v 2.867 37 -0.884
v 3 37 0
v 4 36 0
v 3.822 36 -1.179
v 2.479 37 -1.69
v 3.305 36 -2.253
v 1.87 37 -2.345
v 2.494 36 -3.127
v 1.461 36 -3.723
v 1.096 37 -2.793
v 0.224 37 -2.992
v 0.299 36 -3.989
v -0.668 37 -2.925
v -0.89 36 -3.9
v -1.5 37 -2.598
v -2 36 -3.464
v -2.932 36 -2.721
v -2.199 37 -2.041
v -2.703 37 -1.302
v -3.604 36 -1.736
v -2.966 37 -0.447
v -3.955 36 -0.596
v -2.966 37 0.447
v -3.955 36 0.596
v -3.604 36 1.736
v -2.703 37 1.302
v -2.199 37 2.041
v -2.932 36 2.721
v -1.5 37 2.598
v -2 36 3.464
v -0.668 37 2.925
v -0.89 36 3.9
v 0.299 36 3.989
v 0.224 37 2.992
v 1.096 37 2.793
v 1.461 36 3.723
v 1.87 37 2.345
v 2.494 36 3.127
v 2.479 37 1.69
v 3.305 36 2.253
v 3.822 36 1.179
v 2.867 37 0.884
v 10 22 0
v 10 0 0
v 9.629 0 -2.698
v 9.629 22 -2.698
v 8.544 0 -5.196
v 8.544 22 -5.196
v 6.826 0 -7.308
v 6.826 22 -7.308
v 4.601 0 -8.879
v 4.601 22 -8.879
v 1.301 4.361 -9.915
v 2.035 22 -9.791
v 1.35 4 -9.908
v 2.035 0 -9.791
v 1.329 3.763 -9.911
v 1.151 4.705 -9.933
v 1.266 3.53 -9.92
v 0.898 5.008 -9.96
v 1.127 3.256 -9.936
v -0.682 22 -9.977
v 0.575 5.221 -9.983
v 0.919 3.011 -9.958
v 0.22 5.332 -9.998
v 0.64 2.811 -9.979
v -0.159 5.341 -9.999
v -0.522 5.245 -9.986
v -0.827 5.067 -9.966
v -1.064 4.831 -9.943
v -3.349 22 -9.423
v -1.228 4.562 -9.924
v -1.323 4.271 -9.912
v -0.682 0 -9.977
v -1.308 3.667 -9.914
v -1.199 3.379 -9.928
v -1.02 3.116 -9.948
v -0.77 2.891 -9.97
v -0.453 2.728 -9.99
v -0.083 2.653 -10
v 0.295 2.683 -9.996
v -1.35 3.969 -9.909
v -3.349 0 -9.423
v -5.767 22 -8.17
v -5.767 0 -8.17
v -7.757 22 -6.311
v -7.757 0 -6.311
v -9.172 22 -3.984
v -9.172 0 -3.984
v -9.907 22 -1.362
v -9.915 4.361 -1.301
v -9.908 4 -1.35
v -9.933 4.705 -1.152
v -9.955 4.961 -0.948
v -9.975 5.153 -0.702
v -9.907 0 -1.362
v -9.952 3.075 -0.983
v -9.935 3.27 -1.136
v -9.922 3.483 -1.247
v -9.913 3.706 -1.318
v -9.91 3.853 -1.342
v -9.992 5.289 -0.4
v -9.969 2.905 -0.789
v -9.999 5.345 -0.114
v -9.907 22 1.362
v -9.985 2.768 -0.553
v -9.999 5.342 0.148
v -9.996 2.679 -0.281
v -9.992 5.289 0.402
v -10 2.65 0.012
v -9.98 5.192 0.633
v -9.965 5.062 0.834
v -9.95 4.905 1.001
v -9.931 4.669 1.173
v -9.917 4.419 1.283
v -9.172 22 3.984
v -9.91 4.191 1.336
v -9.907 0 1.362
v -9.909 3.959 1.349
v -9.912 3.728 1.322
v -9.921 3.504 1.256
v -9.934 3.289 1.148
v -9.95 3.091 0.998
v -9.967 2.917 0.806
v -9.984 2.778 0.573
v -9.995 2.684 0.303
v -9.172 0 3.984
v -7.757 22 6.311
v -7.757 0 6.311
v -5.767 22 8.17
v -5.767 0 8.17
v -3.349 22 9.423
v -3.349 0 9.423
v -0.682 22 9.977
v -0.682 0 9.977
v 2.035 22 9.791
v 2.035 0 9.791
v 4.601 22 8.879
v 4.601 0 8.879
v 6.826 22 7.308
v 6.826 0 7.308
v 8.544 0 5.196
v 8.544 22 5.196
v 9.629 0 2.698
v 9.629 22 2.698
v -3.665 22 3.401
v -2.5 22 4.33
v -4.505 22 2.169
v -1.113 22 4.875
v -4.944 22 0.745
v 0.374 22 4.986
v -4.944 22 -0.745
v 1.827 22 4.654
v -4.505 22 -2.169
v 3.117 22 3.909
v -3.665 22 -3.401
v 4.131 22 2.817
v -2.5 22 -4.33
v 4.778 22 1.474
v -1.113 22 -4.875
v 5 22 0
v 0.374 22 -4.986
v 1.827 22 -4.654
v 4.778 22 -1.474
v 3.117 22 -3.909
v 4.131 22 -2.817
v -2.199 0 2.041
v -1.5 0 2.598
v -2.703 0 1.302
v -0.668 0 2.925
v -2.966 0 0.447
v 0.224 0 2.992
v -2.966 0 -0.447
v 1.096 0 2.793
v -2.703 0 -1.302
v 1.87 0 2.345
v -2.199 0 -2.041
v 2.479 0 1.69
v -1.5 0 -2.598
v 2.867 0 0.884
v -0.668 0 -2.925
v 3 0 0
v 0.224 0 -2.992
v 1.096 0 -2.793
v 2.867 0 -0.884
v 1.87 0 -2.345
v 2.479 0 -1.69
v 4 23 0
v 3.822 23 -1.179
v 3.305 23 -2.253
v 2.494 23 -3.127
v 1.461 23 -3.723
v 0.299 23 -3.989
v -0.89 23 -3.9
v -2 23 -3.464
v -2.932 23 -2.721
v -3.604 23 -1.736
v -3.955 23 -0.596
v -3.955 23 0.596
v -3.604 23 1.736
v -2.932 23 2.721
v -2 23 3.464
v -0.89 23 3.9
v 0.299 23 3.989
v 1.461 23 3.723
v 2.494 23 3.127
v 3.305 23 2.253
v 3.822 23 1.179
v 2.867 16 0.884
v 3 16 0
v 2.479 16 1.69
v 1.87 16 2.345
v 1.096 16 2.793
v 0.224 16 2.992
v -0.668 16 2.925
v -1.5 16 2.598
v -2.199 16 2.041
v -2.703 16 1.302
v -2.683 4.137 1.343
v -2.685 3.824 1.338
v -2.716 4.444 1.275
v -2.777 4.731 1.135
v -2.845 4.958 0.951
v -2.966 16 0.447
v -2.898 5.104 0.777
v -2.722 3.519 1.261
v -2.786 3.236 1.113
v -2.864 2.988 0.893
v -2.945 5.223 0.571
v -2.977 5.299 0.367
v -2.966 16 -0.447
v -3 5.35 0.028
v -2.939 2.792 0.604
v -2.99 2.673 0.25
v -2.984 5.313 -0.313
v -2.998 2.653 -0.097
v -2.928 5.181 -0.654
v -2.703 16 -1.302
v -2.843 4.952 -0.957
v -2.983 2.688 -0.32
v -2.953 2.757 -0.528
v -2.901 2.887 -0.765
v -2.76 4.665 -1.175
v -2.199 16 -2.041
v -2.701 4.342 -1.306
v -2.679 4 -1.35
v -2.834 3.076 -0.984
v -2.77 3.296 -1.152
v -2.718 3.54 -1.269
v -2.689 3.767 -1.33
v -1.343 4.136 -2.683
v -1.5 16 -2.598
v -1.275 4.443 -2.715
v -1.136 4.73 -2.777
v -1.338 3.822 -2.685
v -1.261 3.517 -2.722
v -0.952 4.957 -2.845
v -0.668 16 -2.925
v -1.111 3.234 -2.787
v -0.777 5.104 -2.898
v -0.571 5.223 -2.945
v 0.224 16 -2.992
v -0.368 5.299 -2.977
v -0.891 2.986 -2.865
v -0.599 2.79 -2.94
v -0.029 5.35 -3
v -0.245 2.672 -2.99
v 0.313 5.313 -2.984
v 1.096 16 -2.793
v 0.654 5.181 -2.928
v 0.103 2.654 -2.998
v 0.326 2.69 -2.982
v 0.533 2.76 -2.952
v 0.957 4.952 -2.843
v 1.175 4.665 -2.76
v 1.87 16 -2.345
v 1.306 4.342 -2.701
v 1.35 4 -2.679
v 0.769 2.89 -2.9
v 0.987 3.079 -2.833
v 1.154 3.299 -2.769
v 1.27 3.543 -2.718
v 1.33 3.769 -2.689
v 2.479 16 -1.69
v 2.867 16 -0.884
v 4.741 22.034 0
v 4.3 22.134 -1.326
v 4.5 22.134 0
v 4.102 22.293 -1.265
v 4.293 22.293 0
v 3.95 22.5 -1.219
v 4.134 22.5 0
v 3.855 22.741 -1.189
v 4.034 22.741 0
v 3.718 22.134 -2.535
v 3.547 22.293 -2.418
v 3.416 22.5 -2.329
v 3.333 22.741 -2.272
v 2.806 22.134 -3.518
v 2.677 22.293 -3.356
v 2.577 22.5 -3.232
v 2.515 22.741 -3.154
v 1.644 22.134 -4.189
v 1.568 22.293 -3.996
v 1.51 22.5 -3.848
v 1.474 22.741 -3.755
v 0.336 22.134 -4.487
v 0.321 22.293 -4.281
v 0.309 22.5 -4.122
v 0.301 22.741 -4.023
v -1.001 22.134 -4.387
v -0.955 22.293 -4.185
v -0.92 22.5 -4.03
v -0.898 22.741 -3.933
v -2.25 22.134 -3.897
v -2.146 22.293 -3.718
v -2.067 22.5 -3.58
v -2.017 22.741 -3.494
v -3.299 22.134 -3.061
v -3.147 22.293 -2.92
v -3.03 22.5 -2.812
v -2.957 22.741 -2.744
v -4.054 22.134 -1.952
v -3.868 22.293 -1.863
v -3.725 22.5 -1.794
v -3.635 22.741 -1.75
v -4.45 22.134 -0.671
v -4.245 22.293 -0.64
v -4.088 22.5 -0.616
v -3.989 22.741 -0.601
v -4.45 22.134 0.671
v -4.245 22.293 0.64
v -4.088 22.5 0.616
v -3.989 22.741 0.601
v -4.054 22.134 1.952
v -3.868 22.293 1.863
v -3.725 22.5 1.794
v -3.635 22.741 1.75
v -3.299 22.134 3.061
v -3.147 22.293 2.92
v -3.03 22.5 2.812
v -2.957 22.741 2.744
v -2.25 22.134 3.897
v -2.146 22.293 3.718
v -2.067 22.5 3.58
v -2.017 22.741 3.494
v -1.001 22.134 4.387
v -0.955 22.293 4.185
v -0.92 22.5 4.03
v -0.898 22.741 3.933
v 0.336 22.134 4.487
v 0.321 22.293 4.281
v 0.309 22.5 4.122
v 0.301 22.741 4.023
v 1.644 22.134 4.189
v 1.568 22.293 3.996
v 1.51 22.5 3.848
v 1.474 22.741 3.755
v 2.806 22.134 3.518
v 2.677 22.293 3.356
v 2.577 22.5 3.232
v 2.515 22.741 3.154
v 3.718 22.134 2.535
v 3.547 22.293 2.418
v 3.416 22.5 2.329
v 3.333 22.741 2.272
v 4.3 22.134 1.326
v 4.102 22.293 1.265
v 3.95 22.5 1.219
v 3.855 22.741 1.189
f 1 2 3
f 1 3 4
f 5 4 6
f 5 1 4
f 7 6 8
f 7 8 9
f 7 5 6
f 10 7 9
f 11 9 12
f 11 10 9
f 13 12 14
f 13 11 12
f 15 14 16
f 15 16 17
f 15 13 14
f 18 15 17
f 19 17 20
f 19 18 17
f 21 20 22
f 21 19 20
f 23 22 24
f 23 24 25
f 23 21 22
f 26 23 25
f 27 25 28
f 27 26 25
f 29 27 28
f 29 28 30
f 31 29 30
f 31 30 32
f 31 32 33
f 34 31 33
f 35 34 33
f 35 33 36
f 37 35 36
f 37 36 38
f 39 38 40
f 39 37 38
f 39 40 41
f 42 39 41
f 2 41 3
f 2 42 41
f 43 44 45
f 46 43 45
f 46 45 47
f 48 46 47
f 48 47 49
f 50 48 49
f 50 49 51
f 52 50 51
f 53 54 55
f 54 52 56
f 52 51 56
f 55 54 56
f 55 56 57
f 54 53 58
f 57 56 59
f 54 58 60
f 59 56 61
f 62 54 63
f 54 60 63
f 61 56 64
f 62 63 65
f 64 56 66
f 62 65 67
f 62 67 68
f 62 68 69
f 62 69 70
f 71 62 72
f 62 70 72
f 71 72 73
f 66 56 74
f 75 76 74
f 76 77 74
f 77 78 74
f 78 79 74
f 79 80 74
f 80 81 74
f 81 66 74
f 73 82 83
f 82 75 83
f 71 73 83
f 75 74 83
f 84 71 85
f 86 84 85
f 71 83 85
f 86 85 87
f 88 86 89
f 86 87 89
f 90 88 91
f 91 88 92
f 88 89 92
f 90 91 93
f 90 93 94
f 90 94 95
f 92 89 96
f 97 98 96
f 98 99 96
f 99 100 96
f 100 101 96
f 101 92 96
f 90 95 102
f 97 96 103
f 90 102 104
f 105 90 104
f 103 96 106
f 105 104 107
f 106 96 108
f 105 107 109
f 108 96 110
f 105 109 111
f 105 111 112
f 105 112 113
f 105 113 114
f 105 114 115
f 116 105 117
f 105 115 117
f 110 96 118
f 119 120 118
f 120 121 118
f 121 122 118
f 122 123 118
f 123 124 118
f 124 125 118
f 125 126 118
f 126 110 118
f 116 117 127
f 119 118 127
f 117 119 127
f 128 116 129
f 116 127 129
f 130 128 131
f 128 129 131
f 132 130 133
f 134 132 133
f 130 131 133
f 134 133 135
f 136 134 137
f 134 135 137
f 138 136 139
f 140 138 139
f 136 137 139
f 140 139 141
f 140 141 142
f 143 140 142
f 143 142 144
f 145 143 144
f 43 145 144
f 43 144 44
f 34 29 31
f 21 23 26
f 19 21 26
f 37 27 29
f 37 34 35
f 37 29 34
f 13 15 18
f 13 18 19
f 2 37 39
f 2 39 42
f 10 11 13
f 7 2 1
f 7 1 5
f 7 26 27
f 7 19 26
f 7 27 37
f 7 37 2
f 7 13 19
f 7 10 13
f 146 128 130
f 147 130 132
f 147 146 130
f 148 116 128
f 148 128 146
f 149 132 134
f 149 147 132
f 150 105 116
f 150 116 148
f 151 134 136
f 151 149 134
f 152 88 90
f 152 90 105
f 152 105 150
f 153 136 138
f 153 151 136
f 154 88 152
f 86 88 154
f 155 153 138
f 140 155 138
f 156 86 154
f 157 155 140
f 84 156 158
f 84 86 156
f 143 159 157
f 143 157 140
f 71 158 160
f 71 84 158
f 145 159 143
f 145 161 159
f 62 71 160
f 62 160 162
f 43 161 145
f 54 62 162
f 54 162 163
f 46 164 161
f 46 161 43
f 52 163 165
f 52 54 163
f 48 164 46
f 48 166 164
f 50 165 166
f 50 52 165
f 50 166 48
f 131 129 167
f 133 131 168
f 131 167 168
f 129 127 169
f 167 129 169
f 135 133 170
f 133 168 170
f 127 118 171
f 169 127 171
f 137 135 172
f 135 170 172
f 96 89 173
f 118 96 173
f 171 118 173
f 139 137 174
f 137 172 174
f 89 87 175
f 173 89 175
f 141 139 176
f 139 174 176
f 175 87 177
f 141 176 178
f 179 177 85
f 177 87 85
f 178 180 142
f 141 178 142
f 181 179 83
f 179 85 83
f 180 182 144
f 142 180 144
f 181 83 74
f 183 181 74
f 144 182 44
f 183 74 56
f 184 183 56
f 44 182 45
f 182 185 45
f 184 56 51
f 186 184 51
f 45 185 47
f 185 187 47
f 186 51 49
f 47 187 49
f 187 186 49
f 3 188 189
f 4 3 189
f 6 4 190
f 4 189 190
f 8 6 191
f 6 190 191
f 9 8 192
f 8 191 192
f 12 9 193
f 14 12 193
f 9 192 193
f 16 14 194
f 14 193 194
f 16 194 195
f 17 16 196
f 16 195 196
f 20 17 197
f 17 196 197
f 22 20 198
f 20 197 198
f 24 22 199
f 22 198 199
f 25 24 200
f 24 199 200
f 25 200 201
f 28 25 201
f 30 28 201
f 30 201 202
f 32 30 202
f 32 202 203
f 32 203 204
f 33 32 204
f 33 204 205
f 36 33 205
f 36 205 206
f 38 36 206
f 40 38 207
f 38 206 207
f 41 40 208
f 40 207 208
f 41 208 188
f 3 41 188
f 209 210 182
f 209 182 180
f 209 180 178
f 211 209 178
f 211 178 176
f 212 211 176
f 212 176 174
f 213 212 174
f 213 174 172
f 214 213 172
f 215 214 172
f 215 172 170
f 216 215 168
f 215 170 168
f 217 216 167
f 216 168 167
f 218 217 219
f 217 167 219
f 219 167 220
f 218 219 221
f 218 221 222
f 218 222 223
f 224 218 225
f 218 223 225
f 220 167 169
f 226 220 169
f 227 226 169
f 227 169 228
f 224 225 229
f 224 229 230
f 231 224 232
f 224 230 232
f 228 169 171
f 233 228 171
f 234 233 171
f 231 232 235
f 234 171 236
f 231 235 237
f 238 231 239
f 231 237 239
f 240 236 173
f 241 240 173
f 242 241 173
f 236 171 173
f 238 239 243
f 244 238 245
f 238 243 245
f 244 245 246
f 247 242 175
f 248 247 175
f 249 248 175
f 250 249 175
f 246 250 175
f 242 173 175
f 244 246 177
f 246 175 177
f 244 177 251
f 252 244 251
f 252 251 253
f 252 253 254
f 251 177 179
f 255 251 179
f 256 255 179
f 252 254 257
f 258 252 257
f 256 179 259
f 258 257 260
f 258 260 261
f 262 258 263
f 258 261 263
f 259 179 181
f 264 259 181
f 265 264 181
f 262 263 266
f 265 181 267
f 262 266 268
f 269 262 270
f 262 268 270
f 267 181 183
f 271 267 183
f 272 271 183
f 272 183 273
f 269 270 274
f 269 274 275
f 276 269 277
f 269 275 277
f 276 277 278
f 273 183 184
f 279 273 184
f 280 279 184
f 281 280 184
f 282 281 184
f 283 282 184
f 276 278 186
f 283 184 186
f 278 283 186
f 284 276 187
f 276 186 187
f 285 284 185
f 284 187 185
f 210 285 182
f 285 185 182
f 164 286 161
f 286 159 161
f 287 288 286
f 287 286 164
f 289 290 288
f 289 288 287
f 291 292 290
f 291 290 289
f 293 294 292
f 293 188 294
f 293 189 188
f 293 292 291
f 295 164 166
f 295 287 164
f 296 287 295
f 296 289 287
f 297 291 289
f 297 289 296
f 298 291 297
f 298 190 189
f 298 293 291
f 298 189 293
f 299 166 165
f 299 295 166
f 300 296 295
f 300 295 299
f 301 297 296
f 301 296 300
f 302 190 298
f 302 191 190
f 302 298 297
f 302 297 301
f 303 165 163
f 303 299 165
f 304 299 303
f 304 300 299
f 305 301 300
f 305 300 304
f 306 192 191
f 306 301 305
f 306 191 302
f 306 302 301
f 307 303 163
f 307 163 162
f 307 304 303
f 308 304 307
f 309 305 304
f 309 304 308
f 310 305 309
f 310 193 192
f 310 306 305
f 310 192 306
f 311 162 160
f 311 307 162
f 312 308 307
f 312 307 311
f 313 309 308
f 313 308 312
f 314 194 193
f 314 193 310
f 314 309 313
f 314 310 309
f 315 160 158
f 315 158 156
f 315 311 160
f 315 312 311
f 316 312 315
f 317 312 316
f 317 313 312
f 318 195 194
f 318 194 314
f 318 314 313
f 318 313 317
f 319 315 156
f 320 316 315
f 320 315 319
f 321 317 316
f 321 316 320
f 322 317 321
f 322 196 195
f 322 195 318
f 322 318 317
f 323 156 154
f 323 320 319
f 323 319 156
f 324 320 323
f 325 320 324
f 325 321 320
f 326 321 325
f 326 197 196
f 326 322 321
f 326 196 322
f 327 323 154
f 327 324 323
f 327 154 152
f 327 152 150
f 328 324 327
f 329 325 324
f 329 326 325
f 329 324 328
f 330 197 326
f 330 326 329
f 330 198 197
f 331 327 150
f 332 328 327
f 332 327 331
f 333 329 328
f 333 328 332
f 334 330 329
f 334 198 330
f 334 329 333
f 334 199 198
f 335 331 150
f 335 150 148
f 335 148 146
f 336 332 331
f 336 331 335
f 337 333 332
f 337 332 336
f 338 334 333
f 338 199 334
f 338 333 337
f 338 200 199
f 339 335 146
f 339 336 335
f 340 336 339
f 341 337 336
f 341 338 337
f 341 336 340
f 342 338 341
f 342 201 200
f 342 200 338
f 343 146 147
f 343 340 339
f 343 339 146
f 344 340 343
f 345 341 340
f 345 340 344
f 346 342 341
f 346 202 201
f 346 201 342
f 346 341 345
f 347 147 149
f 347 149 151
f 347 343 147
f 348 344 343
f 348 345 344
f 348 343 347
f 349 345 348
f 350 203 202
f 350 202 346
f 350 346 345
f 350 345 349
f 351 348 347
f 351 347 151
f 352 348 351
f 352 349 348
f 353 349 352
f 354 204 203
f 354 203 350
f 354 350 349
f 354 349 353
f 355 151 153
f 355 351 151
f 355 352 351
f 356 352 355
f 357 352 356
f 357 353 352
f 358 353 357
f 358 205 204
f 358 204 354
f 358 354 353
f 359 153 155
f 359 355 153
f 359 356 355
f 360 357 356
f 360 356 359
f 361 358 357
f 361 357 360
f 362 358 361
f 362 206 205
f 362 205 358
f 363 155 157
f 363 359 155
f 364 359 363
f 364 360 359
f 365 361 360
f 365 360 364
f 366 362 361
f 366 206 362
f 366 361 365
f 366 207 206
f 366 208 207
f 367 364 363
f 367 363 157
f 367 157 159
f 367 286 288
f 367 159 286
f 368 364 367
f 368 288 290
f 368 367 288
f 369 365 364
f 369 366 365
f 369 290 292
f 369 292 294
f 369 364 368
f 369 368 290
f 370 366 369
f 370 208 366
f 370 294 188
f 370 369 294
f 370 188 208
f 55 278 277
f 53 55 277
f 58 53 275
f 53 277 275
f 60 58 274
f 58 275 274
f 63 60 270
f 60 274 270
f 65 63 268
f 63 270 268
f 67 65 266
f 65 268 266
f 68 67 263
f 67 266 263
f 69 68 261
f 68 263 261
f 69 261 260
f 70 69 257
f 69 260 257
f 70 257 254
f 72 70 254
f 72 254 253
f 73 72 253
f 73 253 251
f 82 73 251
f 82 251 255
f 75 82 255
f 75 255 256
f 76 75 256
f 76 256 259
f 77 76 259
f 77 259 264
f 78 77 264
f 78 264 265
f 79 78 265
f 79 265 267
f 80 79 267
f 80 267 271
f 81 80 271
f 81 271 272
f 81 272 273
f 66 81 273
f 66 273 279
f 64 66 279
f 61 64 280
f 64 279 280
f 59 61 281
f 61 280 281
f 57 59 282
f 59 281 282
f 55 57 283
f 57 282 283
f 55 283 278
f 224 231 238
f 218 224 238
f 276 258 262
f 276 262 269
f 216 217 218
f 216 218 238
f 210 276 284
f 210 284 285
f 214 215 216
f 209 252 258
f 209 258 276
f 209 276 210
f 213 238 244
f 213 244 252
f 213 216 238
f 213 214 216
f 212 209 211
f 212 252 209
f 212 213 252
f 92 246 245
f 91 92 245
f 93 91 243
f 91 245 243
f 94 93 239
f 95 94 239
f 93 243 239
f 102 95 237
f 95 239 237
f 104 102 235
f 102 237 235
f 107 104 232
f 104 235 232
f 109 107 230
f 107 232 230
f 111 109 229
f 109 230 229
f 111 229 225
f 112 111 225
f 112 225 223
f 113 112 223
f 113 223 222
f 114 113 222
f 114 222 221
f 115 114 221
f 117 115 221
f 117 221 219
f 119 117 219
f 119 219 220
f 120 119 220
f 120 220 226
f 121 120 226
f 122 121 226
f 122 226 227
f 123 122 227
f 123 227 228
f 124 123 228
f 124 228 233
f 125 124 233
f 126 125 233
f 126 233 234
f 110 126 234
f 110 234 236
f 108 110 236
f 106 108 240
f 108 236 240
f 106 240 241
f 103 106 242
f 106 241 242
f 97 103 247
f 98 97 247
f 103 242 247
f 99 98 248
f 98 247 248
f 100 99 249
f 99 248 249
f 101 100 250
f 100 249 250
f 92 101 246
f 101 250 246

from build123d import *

# Parameters (mm, degrees)
SKETCH_1_R          = 10
EXTRUDE_1_DEPTH     = 22
SKETCH_2_R          = 4
EXTRUDE_2_DEPTH     = 15
FILLET_1_R          = 1
CHAMFER_1_SIZE      = 1
SKETCH_4_R          = 3
CUT_EXTRUDE_1_DEPTH = 16
SKETCH_3_R          = 1.35
CUT_EXTRUDE_2_DEPTH = 10
SKETCH_5_R          = 1.35
CUT_EXTRUDE_3_DEPTH = 10


with BuildPart() as part:
    # 草图1 → 凸台-拉伸1 (new body)
    with BuildSketch(Plane(origin=(0, 0, 0), x_dir=(1, 0, 0), z_dir=(0, 1, 0))):
        Circle(SKETCH_1_R)
    extrude(amount=EXTRUDE_1_DEPTH)

    # 草图2 → 凸台-拉伸2 (add)
    with BuildSketch(Plane(origin=(0, 22, 0), x_dir=(1, 0, 0), z_dir=(0, 1, 0))):
        Circle(SKETCH_2_R)
    extrude(amount=EXTRUDE_2_DEPTH)

    # 圆角1
    fillet_1_edges = [part.edges().sort_by_distance(p)[0] for p in [
        (-4, 22, 0),
    ]]
    fillet(fillet_1_edges, radius=FILLET_1_R)

    # 倒角1
    chamfer_1_edges = [part.edges().sort_by_distance(p)[0] for p in [
        (-4, 37, 0),
    ]]
    chamfer(chamfer_1_edges, length=CHAMFER_1_SIZE)

    # 草图4 → 切除-拉伸1 (cut)
    with BuildSketch(Plane.XZ):
        Circle(SKETCH_4_R)
    extrude(amount=-CUT_EXTRUDE_1_DEPTH, mode=Mode.SUBTRACT)

    # 草图3 → 切除-拉伸2 (cut)
    with BuildSketch(Plane.XY):
        with Locations((0, 4)):
            Circle(SKETCH_3_R)
    extrude(amount=-CUT_EXTRUDE_2_DEPTH, mode=Mode.SUBTRACT)

    # 草图5 → 切除-拉伸3 (cut)
    with BuildSketch(Plane(origin=(0, 0, 0), x_dir=(0, 0, -1), z_dir=(1, 0, 0))):
        with Locations((0, 4)):
            Circle(SKETCH_5_R)
    extrude(amount=-CUT_EXTRUDE_3_DEPTH, mode=Mode.SUBTRACT)


solid = part.part
